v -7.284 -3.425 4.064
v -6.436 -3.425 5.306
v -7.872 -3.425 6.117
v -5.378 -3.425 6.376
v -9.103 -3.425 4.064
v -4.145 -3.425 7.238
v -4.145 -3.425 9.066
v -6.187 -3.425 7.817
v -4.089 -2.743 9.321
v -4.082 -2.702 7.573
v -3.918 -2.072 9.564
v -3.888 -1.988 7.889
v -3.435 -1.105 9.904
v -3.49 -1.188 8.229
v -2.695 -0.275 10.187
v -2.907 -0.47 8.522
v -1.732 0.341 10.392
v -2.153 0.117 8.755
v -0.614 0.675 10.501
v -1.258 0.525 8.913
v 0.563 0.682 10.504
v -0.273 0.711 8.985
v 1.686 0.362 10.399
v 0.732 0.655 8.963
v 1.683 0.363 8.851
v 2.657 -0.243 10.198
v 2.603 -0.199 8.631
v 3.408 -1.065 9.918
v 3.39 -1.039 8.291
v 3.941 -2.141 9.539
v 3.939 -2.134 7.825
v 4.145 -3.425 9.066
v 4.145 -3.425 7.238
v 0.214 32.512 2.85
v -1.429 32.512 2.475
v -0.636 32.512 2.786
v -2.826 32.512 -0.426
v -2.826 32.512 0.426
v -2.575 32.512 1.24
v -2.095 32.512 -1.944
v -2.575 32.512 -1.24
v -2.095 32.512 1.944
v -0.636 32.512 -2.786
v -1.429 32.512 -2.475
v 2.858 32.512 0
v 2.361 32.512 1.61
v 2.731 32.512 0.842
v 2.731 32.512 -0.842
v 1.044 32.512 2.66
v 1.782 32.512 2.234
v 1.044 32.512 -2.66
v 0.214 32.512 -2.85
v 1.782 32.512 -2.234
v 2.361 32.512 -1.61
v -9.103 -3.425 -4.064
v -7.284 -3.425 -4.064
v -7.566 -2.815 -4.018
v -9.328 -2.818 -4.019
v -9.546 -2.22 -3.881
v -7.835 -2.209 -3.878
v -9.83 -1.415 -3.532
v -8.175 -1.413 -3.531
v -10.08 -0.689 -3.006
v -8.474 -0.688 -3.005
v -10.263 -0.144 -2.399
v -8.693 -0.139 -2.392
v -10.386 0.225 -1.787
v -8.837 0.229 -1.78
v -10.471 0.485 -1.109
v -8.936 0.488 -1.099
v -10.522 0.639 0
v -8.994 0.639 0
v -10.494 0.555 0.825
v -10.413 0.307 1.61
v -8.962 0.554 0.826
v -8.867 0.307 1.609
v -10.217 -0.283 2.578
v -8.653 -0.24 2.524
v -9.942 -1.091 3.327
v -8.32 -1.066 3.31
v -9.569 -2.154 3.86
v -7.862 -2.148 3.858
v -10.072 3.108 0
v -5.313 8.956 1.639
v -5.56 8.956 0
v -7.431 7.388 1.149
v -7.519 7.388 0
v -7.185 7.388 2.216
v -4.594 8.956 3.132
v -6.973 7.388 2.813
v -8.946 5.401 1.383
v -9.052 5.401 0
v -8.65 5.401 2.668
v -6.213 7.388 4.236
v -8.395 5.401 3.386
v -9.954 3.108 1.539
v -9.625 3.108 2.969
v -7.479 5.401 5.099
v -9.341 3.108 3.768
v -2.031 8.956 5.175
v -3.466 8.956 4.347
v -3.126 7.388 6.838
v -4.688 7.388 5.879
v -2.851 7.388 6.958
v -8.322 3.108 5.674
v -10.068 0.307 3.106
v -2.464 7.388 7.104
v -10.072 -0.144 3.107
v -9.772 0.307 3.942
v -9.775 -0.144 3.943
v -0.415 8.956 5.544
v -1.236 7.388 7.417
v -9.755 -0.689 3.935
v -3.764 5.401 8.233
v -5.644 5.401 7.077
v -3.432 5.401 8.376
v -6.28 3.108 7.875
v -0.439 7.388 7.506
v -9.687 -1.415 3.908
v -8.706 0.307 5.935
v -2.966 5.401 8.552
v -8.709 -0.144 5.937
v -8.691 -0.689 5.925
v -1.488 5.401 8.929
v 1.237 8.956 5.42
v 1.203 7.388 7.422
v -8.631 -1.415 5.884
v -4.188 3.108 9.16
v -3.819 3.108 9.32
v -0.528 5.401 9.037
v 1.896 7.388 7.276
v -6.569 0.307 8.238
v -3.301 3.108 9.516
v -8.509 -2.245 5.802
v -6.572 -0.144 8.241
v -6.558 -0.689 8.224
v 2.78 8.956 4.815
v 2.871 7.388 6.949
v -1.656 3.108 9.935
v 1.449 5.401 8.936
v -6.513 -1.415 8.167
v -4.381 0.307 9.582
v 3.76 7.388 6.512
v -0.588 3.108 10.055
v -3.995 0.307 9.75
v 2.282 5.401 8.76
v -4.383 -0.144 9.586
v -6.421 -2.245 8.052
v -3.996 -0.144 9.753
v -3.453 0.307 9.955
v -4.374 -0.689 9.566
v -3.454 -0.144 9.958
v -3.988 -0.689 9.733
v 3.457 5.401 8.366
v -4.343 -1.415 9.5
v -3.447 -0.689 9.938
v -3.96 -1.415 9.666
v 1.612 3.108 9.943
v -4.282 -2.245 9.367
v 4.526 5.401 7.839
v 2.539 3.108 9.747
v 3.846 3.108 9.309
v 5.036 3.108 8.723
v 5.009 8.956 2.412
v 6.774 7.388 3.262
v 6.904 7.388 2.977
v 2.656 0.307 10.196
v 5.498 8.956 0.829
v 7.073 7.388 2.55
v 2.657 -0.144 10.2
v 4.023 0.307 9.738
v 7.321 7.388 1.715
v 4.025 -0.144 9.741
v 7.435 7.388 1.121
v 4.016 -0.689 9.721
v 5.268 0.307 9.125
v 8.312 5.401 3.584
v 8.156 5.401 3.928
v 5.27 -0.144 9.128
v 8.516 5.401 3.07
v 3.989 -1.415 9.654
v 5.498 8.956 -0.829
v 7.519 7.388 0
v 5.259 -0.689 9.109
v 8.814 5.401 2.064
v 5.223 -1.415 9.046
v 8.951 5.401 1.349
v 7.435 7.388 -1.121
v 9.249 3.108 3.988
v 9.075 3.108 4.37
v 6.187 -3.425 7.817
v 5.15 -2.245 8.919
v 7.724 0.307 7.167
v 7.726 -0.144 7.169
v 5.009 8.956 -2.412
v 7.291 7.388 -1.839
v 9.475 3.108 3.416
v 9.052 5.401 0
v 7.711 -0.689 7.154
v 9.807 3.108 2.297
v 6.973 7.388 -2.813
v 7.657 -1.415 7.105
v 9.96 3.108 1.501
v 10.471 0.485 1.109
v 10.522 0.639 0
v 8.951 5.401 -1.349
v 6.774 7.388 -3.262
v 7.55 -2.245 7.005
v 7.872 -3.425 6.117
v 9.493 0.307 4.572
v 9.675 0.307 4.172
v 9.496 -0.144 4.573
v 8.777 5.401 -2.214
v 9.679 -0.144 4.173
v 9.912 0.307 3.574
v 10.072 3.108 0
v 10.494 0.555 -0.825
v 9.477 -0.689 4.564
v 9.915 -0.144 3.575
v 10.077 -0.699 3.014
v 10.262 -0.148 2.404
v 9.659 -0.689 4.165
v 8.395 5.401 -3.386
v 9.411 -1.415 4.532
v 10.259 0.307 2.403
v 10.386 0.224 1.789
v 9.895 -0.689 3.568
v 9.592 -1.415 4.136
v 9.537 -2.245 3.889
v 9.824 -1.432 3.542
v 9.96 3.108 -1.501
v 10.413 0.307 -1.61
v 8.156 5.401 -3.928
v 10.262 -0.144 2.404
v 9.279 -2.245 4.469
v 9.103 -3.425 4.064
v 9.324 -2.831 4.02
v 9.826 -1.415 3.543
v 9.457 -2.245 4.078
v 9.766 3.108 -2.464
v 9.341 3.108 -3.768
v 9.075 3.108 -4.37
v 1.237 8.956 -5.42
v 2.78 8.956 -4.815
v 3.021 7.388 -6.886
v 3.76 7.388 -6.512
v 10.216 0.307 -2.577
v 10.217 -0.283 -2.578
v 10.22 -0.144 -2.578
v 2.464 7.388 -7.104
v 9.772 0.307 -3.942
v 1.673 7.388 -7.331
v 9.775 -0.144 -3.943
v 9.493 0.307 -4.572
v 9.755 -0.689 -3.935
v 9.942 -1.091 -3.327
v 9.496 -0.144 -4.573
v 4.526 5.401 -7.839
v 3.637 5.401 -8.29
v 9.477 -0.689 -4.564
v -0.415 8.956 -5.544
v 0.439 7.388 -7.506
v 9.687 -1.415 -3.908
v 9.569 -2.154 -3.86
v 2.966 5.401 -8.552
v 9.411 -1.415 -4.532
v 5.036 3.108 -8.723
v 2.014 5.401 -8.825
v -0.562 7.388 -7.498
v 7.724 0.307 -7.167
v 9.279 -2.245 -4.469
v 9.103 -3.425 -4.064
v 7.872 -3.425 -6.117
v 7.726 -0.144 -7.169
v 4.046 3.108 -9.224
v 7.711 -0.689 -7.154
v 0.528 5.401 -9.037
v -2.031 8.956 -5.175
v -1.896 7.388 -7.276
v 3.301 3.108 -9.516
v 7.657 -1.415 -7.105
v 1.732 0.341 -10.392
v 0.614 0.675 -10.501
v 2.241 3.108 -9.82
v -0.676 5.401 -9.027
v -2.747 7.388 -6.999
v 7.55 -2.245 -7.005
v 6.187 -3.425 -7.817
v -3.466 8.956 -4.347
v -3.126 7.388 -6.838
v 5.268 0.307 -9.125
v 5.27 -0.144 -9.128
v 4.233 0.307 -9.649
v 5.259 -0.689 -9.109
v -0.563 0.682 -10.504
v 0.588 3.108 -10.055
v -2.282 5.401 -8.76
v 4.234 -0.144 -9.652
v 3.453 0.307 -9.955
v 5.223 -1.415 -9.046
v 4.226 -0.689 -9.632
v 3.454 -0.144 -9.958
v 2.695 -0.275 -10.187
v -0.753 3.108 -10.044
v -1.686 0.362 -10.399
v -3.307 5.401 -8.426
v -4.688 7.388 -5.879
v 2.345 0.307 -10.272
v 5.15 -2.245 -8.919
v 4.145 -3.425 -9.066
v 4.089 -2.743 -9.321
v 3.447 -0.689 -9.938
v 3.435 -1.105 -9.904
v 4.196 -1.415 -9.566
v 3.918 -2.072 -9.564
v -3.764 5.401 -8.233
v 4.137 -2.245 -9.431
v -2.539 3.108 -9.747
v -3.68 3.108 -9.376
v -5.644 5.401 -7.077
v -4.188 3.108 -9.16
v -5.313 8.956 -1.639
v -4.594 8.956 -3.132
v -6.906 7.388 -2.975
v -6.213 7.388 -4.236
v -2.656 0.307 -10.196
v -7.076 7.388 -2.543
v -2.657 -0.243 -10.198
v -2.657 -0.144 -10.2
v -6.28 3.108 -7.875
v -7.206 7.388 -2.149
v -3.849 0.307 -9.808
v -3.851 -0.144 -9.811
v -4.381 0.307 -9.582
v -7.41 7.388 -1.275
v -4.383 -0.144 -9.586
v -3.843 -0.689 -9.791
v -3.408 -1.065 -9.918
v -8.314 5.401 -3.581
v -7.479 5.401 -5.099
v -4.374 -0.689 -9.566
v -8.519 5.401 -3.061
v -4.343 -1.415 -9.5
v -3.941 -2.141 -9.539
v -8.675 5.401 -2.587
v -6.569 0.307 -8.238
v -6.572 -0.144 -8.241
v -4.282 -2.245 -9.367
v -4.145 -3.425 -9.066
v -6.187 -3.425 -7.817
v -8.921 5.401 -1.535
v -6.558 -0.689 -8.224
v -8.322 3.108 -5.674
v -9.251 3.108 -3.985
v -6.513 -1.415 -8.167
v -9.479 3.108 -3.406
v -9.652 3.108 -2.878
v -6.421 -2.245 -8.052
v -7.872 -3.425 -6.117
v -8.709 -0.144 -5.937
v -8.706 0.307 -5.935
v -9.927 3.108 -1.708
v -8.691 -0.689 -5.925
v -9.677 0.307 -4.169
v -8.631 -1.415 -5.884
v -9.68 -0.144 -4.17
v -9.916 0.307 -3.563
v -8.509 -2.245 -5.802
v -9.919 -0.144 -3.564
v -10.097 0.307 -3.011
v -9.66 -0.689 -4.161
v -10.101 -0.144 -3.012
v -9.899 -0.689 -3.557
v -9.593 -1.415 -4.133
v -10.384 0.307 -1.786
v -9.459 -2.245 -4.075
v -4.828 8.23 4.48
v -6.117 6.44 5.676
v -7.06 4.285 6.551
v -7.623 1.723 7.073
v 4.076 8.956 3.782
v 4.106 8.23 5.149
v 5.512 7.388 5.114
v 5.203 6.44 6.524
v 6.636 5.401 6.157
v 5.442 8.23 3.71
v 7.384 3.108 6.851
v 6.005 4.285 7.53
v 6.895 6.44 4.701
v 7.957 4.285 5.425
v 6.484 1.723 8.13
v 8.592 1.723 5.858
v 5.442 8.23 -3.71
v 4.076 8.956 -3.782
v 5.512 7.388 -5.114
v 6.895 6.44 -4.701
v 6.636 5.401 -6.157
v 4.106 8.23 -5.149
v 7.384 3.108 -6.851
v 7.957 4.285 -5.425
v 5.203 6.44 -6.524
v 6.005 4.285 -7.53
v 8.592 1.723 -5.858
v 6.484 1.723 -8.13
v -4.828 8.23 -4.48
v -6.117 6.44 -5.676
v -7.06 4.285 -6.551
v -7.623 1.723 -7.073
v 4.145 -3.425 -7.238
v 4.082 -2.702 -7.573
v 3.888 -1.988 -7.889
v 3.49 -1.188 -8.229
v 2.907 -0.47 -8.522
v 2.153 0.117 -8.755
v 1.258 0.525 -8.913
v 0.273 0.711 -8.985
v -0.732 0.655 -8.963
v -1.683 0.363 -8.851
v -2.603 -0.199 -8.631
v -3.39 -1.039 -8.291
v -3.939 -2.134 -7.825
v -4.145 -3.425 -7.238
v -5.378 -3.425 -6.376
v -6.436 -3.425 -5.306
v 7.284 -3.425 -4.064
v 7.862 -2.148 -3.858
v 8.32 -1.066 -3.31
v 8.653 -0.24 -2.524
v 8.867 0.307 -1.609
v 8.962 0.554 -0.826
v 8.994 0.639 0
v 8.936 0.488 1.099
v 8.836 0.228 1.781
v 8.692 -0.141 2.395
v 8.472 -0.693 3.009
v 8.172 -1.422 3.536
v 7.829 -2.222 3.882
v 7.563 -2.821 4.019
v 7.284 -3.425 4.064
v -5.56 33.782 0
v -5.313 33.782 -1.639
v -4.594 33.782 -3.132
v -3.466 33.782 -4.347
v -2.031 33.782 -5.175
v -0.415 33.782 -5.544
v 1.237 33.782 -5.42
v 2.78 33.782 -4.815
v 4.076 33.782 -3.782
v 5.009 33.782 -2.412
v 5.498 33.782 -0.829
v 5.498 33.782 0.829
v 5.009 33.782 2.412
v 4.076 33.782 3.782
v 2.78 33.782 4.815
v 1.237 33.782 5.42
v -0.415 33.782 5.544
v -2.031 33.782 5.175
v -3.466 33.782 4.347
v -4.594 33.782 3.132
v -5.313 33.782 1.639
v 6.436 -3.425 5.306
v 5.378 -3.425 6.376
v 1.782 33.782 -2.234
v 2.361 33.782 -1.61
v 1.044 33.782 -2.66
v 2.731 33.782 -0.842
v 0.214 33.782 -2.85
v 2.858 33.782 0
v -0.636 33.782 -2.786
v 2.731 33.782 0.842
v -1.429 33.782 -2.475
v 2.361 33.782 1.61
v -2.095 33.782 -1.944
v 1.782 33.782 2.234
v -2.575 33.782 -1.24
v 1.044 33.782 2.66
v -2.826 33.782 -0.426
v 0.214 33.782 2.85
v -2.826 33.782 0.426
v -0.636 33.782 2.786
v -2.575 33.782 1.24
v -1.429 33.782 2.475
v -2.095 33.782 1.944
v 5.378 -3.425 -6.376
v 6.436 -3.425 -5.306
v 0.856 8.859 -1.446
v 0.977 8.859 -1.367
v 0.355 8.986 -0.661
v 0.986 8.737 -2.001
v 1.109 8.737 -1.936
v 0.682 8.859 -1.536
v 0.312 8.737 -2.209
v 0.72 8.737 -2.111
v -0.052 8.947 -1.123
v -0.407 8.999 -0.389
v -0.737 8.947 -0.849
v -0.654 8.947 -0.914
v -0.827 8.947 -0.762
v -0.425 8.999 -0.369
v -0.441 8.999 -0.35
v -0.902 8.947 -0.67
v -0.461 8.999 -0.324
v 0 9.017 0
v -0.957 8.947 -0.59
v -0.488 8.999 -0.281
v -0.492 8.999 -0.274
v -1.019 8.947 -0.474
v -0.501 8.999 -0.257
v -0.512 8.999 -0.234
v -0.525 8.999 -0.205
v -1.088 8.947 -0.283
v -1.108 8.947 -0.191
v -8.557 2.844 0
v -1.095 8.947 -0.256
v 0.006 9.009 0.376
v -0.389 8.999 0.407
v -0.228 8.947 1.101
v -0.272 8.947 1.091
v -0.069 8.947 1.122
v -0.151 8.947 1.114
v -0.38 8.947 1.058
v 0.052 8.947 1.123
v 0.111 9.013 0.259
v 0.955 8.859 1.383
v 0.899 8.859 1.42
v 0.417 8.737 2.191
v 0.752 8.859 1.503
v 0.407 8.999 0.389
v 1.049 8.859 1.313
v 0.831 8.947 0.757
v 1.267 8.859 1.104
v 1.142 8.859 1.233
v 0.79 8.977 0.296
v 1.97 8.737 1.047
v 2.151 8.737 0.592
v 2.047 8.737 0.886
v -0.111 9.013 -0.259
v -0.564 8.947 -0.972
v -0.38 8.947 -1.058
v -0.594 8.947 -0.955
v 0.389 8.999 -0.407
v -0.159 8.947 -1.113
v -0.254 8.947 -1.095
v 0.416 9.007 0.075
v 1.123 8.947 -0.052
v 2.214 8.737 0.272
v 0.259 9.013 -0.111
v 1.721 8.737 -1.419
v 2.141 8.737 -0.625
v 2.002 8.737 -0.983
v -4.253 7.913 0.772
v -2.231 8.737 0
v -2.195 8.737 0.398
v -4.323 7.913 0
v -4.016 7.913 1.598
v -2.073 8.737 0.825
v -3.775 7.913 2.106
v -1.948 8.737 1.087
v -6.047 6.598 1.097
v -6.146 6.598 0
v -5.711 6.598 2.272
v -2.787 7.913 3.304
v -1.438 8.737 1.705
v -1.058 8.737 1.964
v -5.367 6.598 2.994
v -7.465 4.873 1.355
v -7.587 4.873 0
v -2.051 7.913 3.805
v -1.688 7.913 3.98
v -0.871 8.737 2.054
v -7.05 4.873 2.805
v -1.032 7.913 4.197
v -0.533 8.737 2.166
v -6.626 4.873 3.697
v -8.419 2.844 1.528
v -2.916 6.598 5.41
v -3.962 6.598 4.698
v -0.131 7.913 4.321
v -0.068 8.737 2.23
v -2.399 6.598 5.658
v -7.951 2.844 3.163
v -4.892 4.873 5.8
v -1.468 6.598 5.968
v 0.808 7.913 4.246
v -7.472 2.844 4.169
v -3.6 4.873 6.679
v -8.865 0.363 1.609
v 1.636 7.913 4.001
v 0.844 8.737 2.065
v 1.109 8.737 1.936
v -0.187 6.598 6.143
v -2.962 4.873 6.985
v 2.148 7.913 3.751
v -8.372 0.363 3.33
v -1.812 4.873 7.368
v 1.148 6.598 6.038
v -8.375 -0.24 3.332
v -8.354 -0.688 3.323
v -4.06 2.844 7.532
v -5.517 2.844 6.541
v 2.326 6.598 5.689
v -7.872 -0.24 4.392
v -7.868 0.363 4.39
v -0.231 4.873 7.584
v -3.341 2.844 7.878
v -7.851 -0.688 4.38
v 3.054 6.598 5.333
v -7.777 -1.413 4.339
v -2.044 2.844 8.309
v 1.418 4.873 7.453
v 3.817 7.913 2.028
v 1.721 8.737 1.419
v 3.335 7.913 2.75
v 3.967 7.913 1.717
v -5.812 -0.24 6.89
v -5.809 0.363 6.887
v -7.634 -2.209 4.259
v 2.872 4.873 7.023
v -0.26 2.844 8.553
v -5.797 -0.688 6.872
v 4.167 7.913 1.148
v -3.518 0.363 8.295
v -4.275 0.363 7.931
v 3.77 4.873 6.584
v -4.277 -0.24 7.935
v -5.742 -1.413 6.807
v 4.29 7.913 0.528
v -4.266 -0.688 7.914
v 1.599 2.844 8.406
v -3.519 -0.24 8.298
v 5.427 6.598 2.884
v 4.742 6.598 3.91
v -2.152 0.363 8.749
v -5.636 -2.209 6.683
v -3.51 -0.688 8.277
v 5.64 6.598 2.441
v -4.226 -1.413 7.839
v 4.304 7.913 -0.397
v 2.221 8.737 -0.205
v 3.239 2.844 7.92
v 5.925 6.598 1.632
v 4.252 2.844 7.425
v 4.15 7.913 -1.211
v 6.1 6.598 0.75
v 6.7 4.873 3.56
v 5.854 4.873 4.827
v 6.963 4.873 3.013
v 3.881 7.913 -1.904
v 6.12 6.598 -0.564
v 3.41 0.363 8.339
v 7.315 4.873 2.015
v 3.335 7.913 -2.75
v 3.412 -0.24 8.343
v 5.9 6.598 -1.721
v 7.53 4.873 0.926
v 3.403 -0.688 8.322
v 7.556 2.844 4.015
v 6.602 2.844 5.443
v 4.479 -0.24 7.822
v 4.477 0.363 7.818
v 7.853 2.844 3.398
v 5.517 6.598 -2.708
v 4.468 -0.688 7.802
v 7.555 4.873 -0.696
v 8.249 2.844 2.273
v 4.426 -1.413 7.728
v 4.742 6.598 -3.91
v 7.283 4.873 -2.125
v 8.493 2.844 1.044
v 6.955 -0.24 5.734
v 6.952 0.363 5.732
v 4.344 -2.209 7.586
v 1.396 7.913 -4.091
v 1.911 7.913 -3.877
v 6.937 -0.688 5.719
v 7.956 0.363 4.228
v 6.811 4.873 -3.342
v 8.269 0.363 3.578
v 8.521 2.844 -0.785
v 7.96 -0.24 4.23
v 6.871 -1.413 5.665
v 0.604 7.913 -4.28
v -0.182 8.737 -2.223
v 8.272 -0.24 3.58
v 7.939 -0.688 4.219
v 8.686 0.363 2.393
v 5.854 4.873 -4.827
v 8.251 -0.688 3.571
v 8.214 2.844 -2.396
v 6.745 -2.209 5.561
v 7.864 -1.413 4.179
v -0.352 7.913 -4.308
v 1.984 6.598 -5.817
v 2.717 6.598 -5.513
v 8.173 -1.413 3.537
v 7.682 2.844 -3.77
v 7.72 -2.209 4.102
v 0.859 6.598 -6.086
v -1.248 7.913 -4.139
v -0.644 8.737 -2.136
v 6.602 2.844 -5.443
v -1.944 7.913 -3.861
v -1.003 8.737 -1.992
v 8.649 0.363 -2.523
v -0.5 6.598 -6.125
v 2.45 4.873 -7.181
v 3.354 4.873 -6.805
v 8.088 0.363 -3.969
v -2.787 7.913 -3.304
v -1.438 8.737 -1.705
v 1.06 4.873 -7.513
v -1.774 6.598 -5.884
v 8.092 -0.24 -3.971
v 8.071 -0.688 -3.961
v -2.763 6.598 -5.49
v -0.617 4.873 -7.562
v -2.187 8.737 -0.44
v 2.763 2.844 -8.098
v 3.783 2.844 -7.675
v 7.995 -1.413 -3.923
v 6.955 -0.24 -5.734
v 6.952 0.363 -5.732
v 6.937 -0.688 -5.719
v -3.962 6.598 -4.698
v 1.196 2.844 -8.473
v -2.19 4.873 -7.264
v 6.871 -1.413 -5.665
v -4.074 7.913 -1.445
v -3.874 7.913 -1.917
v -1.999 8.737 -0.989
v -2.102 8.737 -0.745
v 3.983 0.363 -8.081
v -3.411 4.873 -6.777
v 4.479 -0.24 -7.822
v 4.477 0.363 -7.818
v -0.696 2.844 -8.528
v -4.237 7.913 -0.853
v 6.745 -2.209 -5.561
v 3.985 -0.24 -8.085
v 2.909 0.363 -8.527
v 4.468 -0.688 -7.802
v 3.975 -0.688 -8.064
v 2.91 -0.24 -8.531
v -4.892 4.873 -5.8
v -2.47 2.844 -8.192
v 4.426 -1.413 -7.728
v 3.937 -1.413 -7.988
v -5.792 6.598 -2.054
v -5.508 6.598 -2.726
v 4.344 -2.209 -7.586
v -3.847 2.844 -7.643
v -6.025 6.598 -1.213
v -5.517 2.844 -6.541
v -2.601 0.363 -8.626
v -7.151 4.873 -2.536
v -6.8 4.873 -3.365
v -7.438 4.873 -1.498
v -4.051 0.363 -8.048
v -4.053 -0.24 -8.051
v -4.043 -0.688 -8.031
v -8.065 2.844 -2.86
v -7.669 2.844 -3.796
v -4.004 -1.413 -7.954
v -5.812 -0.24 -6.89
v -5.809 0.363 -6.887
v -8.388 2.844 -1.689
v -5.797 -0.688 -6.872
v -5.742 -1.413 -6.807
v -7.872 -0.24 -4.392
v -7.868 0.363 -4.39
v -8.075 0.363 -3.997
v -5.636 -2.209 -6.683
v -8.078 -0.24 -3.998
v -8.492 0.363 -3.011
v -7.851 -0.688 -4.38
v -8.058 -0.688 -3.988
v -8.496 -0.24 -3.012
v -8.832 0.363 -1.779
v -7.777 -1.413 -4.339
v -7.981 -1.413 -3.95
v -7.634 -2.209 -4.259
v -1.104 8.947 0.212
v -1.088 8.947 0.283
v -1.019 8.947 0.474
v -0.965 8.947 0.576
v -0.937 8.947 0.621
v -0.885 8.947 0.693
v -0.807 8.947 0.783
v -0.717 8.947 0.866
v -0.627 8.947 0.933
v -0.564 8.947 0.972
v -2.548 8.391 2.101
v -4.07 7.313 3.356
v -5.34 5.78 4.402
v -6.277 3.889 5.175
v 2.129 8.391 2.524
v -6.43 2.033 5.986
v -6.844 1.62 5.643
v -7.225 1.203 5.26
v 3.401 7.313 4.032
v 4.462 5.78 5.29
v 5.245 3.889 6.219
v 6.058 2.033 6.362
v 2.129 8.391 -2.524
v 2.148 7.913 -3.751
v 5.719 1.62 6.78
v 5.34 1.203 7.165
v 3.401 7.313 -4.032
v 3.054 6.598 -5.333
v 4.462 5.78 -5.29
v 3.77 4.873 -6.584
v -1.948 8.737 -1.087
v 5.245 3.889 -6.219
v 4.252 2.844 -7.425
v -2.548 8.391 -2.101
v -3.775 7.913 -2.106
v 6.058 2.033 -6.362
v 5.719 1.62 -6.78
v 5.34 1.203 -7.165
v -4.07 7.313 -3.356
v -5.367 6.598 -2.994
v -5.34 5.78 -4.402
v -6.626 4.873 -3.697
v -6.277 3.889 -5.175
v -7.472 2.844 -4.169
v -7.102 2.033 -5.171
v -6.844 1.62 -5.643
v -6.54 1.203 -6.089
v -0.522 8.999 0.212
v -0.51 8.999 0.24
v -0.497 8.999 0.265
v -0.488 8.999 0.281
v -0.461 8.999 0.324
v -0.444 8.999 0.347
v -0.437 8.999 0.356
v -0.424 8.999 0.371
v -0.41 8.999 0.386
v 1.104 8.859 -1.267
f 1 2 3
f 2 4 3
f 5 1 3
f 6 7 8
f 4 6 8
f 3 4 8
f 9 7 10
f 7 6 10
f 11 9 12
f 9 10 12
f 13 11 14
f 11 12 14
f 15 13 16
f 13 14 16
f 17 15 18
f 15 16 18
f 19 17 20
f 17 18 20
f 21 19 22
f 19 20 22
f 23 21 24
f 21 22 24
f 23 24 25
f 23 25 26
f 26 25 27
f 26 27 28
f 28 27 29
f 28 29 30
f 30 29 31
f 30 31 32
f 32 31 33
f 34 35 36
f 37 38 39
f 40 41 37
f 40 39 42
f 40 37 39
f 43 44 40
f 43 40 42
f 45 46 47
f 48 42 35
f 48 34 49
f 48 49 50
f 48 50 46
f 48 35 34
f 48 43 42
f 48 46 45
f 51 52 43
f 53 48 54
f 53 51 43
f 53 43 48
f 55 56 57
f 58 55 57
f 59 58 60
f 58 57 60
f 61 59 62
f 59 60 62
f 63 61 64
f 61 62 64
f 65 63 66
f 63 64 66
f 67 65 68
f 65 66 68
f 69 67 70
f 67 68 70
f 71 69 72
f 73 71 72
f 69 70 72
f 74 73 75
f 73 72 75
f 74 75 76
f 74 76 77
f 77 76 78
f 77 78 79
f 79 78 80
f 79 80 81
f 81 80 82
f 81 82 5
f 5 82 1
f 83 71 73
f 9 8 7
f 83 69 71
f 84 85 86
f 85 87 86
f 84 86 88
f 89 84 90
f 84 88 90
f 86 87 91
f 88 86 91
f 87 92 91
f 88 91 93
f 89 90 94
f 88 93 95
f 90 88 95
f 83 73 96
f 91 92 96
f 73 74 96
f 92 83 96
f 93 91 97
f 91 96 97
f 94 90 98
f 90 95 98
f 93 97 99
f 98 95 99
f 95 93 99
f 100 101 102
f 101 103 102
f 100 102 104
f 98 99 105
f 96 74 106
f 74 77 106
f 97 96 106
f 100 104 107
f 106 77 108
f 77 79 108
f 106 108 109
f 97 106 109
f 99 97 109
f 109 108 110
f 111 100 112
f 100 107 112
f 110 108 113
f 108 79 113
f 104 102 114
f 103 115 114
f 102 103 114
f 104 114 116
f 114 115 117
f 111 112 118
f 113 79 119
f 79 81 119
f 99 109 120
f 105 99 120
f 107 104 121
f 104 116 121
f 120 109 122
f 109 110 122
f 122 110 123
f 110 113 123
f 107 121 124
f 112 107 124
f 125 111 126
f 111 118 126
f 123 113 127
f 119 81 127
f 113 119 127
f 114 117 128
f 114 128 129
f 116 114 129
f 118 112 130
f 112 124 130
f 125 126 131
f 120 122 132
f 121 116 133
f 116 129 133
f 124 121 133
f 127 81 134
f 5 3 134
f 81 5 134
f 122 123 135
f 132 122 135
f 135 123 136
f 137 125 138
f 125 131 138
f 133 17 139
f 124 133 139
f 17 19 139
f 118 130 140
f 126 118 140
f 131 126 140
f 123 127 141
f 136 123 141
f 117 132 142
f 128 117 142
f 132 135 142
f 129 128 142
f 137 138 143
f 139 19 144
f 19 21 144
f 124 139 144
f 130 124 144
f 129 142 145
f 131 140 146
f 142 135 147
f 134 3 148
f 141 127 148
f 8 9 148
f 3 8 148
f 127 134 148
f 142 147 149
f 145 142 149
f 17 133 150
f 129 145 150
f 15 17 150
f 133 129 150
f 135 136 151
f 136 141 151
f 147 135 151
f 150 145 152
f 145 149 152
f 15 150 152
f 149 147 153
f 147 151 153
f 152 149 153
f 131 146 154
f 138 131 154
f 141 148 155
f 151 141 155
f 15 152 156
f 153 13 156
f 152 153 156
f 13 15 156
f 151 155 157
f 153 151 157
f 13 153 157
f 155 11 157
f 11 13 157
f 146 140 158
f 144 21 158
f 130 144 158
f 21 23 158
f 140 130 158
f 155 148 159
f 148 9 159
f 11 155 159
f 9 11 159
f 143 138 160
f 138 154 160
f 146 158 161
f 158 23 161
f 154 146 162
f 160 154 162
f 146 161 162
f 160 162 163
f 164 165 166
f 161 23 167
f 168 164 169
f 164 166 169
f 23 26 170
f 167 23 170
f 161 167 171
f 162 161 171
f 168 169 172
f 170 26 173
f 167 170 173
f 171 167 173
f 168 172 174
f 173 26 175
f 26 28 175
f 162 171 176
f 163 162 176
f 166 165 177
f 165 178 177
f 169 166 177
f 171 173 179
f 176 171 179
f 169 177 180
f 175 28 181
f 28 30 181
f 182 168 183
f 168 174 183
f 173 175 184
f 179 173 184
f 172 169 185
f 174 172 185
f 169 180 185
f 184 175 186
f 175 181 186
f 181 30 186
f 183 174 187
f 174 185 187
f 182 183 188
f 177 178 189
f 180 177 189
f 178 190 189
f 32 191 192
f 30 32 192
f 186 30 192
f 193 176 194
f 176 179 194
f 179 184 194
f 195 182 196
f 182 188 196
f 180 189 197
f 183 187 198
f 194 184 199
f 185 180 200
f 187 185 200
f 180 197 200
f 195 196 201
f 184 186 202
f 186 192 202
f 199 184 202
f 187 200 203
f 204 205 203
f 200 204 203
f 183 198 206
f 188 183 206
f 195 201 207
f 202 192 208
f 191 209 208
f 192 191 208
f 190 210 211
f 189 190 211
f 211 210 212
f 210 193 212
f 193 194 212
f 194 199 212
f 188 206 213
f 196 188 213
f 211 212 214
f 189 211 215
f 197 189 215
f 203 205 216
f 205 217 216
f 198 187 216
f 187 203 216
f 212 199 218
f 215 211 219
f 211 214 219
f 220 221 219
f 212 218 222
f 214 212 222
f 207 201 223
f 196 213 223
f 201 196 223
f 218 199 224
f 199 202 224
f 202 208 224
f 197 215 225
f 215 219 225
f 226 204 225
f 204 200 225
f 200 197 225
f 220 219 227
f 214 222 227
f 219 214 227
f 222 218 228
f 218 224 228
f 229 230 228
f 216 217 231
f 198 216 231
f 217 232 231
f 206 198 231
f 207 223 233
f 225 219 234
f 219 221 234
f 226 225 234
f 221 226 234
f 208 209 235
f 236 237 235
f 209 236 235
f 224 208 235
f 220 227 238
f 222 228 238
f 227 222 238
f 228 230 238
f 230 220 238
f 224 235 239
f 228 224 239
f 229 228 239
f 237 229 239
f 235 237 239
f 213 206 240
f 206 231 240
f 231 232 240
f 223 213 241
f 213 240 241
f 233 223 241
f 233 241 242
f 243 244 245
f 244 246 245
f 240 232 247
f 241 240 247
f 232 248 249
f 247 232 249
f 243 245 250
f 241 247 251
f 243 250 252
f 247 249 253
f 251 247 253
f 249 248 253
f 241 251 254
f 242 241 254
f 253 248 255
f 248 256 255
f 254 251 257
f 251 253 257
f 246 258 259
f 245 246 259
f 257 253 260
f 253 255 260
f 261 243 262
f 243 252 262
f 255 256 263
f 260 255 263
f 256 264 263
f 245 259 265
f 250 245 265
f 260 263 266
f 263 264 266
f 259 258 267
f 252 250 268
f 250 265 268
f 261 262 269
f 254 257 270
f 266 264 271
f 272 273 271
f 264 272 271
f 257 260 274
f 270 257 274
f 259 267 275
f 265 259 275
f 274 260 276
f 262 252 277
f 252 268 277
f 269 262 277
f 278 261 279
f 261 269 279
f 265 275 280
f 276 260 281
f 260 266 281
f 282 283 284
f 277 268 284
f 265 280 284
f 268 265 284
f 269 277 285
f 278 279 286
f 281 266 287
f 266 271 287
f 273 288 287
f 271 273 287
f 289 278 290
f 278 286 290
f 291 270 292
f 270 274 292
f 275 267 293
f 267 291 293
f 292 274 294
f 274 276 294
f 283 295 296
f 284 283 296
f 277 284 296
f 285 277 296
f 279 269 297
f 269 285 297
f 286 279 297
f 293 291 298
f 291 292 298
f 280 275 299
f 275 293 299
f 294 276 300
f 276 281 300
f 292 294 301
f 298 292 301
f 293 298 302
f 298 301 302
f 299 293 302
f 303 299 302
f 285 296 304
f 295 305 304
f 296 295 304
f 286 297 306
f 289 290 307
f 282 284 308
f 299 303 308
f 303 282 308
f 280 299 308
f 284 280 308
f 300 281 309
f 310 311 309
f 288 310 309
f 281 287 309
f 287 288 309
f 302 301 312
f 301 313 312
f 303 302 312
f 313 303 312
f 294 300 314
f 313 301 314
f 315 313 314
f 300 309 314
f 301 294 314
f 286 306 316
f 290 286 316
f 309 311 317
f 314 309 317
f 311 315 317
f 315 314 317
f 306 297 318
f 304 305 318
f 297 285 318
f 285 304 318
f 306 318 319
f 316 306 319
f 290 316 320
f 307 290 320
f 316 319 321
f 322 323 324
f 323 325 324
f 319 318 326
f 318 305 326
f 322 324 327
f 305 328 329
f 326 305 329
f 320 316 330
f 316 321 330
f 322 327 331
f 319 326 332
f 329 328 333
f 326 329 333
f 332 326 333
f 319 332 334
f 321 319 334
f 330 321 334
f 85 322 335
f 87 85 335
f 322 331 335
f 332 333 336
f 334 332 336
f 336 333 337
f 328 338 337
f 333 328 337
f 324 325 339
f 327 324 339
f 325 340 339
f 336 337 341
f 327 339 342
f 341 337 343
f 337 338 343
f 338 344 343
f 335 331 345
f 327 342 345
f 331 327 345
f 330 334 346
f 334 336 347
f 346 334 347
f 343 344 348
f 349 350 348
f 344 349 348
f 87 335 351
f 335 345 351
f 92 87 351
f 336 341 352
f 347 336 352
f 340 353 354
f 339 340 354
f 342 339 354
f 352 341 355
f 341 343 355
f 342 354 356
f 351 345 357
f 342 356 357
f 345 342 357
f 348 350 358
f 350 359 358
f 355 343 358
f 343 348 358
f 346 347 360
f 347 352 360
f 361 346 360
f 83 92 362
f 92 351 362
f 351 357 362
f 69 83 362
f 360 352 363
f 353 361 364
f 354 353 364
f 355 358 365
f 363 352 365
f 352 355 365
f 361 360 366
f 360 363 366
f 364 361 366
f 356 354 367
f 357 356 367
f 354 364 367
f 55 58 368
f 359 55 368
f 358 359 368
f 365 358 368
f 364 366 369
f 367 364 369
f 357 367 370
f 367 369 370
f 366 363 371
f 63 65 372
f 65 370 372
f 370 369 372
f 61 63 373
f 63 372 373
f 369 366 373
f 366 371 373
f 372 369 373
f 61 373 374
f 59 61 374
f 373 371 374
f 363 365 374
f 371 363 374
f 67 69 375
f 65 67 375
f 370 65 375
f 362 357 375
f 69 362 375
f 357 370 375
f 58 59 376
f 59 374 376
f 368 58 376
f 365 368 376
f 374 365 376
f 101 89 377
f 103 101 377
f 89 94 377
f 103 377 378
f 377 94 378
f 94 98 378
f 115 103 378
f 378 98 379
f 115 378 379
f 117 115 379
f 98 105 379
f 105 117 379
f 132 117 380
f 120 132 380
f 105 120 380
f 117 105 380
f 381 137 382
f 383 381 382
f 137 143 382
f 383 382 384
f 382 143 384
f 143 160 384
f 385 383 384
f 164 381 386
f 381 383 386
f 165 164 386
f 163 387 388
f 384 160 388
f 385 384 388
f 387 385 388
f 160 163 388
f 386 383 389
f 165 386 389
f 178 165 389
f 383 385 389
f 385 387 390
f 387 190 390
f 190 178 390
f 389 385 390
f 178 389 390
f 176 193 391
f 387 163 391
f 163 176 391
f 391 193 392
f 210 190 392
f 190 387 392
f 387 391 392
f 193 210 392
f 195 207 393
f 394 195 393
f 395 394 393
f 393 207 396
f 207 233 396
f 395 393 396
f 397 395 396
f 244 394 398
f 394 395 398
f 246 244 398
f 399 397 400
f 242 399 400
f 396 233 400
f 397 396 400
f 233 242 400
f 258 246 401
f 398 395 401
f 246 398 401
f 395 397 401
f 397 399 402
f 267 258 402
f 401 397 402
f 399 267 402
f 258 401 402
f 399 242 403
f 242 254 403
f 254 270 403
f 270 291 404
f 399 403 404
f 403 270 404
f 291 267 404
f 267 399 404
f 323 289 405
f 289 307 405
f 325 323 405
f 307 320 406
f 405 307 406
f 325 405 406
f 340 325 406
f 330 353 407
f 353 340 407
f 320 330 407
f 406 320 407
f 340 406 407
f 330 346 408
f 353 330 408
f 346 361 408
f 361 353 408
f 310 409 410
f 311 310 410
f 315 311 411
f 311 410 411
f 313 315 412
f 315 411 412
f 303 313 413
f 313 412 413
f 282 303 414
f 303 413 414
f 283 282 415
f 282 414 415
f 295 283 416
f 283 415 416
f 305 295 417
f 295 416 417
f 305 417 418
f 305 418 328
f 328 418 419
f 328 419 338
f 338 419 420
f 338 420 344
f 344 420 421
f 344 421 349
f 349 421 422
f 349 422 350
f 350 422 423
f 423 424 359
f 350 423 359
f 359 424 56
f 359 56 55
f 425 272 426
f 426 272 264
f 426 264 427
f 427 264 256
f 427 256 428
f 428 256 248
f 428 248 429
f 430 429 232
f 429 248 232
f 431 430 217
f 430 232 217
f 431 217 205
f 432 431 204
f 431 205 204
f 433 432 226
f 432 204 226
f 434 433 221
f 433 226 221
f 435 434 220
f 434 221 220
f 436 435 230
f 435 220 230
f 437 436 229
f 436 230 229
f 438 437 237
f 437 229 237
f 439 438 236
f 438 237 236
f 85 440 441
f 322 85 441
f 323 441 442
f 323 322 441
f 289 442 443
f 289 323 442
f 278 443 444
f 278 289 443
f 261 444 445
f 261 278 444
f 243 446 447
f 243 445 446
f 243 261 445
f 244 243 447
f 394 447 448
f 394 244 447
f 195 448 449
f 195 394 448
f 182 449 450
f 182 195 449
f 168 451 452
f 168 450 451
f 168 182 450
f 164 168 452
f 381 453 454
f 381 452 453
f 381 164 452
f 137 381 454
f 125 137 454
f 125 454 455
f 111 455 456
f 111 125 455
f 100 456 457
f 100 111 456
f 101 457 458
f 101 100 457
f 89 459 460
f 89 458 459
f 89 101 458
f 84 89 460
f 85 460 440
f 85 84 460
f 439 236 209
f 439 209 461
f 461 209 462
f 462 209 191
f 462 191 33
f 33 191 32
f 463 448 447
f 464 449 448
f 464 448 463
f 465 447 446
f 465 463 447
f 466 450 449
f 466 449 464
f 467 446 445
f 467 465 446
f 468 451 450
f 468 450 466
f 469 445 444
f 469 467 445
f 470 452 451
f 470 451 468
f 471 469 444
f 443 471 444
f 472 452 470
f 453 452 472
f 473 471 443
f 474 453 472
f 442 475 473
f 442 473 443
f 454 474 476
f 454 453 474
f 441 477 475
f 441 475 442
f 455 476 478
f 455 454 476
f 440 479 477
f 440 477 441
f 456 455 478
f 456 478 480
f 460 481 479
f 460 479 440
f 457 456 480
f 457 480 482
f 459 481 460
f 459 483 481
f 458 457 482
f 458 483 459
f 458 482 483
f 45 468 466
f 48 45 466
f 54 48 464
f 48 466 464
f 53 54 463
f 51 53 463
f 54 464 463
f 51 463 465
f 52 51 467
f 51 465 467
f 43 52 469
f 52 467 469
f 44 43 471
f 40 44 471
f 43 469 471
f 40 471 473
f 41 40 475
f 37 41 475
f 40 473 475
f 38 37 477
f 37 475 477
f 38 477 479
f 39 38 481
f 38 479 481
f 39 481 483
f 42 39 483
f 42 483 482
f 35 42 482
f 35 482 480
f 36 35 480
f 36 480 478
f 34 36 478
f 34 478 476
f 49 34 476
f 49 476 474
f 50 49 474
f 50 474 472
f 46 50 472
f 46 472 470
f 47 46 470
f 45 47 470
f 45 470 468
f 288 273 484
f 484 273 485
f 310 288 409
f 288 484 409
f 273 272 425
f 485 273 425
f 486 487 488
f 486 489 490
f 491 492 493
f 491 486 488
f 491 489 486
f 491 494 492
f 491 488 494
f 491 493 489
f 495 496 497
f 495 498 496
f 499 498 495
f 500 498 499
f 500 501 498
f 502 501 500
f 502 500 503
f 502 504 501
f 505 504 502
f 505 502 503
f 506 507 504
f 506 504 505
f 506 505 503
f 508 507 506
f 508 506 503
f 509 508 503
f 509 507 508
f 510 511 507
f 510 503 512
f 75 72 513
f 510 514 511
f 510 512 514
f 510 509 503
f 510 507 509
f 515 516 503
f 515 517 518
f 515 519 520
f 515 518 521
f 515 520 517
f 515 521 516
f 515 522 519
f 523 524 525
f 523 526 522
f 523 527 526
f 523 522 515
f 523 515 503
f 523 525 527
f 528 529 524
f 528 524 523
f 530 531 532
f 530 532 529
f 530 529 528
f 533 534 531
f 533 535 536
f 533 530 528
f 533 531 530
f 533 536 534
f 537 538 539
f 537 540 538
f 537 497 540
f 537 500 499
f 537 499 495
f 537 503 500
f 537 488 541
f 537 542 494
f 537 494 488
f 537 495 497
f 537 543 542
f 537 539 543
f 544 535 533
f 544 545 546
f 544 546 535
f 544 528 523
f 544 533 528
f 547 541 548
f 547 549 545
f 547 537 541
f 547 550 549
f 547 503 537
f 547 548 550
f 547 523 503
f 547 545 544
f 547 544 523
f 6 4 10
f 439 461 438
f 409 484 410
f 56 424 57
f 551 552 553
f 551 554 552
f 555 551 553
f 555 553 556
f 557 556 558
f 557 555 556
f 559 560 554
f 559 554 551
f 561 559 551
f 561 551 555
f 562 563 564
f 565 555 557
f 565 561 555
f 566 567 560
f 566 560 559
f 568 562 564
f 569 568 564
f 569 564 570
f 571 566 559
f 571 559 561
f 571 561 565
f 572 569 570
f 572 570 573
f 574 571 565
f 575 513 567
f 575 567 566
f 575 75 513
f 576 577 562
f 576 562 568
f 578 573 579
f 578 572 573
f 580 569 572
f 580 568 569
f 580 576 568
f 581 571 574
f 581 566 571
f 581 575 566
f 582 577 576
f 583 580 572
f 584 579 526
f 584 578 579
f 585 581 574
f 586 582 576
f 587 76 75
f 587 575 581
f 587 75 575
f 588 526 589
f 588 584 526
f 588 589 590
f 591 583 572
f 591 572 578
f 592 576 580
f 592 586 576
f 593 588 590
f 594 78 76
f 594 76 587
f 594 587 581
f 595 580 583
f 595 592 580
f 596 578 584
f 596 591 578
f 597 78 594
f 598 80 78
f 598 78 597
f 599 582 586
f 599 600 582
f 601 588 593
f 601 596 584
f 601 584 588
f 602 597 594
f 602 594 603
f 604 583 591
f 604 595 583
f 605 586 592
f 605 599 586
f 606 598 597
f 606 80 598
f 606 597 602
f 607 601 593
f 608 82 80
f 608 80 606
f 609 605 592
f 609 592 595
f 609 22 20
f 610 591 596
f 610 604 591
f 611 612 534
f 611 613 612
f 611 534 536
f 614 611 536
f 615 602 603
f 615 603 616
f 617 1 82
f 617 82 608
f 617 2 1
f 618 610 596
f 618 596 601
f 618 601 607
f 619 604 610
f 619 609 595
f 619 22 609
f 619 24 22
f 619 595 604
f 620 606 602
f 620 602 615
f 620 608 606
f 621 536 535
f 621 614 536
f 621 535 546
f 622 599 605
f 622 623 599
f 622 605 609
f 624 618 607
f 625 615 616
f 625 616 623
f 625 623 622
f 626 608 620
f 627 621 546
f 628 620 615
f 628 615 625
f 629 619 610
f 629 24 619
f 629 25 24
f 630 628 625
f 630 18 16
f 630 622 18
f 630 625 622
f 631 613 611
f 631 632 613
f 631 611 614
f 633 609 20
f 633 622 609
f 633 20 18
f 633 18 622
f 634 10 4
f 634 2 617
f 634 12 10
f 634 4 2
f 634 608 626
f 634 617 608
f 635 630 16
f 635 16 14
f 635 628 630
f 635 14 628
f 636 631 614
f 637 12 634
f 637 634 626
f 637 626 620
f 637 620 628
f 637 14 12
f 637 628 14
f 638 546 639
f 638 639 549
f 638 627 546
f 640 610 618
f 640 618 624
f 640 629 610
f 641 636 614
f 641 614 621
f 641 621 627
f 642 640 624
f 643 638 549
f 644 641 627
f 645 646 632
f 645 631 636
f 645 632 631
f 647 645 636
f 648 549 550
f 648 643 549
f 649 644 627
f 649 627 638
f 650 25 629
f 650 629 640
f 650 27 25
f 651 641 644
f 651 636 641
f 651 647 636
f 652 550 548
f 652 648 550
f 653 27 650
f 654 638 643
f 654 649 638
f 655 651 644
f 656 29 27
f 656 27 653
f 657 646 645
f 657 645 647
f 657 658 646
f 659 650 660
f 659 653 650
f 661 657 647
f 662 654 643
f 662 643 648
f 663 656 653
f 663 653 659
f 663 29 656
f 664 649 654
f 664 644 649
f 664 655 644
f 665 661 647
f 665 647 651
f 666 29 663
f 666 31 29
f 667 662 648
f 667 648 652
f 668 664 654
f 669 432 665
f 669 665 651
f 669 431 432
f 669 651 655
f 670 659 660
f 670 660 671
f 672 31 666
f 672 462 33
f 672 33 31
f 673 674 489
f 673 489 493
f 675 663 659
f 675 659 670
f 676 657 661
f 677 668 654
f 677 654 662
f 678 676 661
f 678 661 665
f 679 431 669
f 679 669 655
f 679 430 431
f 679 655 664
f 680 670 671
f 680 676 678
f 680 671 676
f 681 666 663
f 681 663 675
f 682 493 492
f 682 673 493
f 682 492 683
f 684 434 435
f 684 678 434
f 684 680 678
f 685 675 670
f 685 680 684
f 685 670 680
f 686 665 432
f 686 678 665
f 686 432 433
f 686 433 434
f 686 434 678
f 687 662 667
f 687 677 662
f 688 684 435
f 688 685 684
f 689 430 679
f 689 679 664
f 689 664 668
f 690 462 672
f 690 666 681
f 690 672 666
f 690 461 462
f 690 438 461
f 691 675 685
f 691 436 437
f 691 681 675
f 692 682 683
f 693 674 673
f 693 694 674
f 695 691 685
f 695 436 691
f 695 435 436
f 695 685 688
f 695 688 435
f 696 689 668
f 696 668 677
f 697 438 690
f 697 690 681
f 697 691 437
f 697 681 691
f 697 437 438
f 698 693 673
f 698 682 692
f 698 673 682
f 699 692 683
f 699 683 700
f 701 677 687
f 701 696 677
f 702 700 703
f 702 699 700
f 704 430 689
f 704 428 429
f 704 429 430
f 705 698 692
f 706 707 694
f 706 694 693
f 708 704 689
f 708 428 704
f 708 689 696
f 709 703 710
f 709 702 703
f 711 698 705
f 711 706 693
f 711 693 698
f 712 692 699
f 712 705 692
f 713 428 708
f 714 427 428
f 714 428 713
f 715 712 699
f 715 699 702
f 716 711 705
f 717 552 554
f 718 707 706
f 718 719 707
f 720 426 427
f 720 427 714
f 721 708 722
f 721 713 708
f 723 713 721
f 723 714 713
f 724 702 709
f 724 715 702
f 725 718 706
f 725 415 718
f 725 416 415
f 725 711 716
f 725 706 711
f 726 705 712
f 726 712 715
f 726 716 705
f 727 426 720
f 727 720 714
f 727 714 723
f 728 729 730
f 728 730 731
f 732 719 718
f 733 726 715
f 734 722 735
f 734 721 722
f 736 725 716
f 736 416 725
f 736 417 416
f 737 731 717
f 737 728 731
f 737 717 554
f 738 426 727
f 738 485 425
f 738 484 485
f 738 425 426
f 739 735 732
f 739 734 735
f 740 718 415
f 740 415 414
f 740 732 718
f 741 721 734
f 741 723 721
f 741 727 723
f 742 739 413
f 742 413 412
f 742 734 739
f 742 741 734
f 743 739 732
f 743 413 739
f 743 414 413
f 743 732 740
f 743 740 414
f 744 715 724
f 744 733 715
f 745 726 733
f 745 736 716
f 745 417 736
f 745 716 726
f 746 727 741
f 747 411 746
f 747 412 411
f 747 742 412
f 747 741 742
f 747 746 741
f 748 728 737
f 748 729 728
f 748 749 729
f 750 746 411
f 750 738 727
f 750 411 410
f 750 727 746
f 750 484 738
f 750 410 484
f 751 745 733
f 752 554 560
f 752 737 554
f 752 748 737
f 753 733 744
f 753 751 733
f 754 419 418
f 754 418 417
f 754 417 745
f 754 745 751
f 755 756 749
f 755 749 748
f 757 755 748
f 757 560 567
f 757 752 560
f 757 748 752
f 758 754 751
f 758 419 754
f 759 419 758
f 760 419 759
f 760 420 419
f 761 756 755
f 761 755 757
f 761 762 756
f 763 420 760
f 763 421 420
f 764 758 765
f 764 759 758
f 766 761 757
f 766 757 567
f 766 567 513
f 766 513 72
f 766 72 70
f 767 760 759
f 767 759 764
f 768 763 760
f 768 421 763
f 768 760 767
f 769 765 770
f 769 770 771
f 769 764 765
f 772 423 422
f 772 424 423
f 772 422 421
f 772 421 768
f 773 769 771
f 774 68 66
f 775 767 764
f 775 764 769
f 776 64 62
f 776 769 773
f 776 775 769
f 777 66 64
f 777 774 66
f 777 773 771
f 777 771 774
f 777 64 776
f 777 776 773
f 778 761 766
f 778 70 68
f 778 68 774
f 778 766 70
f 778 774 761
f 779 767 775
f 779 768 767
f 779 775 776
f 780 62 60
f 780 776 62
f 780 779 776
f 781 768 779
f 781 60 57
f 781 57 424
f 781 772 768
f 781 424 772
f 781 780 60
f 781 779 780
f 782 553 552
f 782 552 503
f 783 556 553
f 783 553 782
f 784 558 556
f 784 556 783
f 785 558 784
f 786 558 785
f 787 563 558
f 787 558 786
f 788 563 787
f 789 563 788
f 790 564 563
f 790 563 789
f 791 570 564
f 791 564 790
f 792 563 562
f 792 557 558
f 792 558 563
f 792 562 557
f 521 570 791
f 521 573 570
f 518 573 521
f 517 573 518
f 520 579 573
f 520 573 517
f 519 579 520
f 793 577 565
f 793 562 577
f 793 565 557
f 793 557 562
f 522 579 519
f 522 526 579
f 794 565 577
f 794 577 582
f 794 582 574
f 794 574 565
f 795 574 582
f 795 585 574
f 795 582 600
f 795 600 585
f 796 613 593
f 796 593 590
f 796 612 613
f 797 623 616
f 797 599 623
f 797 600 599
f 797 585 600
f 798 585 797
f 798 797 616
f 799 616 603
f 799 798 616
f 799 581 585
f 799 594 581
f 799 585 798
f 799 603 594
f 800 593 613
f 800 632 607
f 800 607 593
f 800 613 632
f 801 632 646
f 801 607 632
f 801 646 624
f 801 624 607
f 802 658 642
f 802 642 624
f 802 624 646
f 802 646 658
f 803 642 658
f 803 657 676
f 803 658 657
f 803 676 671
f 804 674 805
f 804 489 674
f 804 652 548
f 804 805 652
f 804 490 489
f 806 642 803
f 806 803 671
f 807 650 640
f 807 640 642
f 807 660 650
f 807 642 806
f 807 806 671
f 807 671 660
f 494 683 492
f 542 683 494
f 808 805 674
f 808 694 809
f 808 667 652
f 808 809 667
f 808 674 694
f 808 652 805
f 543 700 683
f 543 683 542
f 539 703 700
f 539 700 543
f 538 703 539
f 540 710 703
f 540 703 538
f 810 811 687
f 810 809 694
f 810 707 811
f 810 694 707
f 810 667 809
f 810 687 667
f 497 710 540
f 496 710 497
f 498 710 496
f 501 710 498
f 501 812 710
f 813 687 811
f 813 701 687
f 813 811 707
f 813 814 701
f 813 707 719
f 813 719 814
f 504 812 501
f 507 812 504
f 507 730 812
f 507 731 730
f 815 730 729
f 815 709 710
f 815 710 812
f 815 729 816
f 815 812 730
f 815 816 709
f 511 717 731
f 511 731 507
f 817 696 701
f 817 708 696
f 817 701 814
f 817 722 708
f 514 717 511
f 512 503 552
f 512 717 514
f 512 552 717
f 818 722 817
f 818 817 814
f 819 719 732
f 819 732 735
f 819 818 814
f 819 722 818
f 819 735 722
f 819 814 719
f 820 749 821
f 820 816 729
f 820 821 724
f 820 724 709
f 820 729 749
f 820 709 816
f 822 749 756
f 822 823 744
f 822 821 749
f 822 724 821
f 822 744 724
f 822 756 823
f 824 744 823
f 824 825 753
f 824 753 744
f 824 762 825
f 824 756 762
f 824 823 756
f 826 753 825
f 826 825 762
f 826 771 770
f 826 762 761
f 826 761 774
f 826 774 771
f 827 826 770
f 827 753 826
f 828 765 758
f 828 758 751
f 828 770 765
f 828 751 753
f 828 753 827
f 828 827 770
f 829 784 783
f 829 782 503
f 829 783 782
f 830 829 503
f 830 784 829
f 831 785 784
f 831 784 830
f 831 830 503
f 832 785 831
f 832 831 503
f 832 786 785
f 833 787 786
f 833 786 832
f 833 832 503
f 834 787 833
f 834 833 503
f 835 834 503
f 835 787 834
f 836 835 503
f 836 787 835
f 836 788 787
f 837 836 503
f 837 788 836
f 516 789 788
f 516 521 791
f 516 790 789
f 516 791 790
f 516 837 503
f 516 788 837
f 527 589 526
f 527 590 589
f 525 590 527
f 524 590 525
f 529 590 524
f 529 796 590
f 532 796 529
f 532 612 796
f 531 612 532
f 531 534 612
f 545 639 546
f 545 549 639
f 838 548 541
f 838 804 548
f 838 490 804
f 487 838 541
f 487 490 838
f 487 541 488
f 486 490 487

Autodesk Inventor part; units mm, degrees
ref_plane "YZ Plane" through (0, 0, 0) normal (1, 0, 0) x (0, 1, 0)
ref_plane "XZ Plane" through (0, 0, 0) normal (0, 1, 0) x (-1, 0, 0)
ref_plane "XY Plane" through (0, 0, 0) normal (0, 0, 1) x (1, 0, 0)
sketch "Sketch1" plane through (0, 0, 0) normal (0, 0, 1) x (1, 0, 0)
  arc A0 (-5.5597, 8.9556) -> (-9.9691, -3.4248) centre (0, 0) ccw
  line L0 (0, 0) -> (0, 33.782)
  line L1 (0, 33.782) -> (-5.5597, 33.782)
  line L2 (-5.5597, 33.782) -> (-5.5597, 8.9556)
  line L3 (0, 0) -> (0, -2.735)
  arc A1 (0, 9.017) -> (-8.3413, -3.4248) centre (0, 0) ccw
  line L4 (-9.9691, -3.4248) -> (-8.3413, -3.4248)
  dimension "d1" = 21.082
  dimension "d2" = 1.524
  dimension "d12" = 33.782
revolve "Revolution1" add sketch "Sketch1" angle 360 about axis through (0, 0, 0) along (0, 1, 0)
sketch "Sketch4" plane through (0, 33.782, 0) normal (0, 1, 0) x (1, 0, 0)
  circle A0 centre (0, 0) radius 2.8575
  dimension "d4" = 5.715
extrude "Extrusion1" cut sketch "Sketch4" against normal blind 1.27
sketch "Sketch5" plane through (0, 0, 0) normal (1, 0, 0) x (0, 1, 0)
  line L0 (-3.4248, -9.9691) -> (-3.4248, 9.9691) projected
  circle A0 centre (-3.4248, 0) radius 4.064
  point P0 (0, 0)
  dimension "d7" = 8.128
extrude "Extrusion2" cut sketch "Sketch5" along normal mid plane 2540
sketch "Sketch7" plane through (0, 0, 0) normal (0, 0, 1) x (1, 0, 0)
  line L0 (7.2843, -3.4248) -> (-7.2843, -3.4248) projected
  circle A0 centre (0, -3.4248) radius 4.1452
  point P0 (0, 0)
extrude "Extrusion3" cut sketch "Sketch7" along normal mid plane 2540
properties part number "caster sumo jeffrey p"
